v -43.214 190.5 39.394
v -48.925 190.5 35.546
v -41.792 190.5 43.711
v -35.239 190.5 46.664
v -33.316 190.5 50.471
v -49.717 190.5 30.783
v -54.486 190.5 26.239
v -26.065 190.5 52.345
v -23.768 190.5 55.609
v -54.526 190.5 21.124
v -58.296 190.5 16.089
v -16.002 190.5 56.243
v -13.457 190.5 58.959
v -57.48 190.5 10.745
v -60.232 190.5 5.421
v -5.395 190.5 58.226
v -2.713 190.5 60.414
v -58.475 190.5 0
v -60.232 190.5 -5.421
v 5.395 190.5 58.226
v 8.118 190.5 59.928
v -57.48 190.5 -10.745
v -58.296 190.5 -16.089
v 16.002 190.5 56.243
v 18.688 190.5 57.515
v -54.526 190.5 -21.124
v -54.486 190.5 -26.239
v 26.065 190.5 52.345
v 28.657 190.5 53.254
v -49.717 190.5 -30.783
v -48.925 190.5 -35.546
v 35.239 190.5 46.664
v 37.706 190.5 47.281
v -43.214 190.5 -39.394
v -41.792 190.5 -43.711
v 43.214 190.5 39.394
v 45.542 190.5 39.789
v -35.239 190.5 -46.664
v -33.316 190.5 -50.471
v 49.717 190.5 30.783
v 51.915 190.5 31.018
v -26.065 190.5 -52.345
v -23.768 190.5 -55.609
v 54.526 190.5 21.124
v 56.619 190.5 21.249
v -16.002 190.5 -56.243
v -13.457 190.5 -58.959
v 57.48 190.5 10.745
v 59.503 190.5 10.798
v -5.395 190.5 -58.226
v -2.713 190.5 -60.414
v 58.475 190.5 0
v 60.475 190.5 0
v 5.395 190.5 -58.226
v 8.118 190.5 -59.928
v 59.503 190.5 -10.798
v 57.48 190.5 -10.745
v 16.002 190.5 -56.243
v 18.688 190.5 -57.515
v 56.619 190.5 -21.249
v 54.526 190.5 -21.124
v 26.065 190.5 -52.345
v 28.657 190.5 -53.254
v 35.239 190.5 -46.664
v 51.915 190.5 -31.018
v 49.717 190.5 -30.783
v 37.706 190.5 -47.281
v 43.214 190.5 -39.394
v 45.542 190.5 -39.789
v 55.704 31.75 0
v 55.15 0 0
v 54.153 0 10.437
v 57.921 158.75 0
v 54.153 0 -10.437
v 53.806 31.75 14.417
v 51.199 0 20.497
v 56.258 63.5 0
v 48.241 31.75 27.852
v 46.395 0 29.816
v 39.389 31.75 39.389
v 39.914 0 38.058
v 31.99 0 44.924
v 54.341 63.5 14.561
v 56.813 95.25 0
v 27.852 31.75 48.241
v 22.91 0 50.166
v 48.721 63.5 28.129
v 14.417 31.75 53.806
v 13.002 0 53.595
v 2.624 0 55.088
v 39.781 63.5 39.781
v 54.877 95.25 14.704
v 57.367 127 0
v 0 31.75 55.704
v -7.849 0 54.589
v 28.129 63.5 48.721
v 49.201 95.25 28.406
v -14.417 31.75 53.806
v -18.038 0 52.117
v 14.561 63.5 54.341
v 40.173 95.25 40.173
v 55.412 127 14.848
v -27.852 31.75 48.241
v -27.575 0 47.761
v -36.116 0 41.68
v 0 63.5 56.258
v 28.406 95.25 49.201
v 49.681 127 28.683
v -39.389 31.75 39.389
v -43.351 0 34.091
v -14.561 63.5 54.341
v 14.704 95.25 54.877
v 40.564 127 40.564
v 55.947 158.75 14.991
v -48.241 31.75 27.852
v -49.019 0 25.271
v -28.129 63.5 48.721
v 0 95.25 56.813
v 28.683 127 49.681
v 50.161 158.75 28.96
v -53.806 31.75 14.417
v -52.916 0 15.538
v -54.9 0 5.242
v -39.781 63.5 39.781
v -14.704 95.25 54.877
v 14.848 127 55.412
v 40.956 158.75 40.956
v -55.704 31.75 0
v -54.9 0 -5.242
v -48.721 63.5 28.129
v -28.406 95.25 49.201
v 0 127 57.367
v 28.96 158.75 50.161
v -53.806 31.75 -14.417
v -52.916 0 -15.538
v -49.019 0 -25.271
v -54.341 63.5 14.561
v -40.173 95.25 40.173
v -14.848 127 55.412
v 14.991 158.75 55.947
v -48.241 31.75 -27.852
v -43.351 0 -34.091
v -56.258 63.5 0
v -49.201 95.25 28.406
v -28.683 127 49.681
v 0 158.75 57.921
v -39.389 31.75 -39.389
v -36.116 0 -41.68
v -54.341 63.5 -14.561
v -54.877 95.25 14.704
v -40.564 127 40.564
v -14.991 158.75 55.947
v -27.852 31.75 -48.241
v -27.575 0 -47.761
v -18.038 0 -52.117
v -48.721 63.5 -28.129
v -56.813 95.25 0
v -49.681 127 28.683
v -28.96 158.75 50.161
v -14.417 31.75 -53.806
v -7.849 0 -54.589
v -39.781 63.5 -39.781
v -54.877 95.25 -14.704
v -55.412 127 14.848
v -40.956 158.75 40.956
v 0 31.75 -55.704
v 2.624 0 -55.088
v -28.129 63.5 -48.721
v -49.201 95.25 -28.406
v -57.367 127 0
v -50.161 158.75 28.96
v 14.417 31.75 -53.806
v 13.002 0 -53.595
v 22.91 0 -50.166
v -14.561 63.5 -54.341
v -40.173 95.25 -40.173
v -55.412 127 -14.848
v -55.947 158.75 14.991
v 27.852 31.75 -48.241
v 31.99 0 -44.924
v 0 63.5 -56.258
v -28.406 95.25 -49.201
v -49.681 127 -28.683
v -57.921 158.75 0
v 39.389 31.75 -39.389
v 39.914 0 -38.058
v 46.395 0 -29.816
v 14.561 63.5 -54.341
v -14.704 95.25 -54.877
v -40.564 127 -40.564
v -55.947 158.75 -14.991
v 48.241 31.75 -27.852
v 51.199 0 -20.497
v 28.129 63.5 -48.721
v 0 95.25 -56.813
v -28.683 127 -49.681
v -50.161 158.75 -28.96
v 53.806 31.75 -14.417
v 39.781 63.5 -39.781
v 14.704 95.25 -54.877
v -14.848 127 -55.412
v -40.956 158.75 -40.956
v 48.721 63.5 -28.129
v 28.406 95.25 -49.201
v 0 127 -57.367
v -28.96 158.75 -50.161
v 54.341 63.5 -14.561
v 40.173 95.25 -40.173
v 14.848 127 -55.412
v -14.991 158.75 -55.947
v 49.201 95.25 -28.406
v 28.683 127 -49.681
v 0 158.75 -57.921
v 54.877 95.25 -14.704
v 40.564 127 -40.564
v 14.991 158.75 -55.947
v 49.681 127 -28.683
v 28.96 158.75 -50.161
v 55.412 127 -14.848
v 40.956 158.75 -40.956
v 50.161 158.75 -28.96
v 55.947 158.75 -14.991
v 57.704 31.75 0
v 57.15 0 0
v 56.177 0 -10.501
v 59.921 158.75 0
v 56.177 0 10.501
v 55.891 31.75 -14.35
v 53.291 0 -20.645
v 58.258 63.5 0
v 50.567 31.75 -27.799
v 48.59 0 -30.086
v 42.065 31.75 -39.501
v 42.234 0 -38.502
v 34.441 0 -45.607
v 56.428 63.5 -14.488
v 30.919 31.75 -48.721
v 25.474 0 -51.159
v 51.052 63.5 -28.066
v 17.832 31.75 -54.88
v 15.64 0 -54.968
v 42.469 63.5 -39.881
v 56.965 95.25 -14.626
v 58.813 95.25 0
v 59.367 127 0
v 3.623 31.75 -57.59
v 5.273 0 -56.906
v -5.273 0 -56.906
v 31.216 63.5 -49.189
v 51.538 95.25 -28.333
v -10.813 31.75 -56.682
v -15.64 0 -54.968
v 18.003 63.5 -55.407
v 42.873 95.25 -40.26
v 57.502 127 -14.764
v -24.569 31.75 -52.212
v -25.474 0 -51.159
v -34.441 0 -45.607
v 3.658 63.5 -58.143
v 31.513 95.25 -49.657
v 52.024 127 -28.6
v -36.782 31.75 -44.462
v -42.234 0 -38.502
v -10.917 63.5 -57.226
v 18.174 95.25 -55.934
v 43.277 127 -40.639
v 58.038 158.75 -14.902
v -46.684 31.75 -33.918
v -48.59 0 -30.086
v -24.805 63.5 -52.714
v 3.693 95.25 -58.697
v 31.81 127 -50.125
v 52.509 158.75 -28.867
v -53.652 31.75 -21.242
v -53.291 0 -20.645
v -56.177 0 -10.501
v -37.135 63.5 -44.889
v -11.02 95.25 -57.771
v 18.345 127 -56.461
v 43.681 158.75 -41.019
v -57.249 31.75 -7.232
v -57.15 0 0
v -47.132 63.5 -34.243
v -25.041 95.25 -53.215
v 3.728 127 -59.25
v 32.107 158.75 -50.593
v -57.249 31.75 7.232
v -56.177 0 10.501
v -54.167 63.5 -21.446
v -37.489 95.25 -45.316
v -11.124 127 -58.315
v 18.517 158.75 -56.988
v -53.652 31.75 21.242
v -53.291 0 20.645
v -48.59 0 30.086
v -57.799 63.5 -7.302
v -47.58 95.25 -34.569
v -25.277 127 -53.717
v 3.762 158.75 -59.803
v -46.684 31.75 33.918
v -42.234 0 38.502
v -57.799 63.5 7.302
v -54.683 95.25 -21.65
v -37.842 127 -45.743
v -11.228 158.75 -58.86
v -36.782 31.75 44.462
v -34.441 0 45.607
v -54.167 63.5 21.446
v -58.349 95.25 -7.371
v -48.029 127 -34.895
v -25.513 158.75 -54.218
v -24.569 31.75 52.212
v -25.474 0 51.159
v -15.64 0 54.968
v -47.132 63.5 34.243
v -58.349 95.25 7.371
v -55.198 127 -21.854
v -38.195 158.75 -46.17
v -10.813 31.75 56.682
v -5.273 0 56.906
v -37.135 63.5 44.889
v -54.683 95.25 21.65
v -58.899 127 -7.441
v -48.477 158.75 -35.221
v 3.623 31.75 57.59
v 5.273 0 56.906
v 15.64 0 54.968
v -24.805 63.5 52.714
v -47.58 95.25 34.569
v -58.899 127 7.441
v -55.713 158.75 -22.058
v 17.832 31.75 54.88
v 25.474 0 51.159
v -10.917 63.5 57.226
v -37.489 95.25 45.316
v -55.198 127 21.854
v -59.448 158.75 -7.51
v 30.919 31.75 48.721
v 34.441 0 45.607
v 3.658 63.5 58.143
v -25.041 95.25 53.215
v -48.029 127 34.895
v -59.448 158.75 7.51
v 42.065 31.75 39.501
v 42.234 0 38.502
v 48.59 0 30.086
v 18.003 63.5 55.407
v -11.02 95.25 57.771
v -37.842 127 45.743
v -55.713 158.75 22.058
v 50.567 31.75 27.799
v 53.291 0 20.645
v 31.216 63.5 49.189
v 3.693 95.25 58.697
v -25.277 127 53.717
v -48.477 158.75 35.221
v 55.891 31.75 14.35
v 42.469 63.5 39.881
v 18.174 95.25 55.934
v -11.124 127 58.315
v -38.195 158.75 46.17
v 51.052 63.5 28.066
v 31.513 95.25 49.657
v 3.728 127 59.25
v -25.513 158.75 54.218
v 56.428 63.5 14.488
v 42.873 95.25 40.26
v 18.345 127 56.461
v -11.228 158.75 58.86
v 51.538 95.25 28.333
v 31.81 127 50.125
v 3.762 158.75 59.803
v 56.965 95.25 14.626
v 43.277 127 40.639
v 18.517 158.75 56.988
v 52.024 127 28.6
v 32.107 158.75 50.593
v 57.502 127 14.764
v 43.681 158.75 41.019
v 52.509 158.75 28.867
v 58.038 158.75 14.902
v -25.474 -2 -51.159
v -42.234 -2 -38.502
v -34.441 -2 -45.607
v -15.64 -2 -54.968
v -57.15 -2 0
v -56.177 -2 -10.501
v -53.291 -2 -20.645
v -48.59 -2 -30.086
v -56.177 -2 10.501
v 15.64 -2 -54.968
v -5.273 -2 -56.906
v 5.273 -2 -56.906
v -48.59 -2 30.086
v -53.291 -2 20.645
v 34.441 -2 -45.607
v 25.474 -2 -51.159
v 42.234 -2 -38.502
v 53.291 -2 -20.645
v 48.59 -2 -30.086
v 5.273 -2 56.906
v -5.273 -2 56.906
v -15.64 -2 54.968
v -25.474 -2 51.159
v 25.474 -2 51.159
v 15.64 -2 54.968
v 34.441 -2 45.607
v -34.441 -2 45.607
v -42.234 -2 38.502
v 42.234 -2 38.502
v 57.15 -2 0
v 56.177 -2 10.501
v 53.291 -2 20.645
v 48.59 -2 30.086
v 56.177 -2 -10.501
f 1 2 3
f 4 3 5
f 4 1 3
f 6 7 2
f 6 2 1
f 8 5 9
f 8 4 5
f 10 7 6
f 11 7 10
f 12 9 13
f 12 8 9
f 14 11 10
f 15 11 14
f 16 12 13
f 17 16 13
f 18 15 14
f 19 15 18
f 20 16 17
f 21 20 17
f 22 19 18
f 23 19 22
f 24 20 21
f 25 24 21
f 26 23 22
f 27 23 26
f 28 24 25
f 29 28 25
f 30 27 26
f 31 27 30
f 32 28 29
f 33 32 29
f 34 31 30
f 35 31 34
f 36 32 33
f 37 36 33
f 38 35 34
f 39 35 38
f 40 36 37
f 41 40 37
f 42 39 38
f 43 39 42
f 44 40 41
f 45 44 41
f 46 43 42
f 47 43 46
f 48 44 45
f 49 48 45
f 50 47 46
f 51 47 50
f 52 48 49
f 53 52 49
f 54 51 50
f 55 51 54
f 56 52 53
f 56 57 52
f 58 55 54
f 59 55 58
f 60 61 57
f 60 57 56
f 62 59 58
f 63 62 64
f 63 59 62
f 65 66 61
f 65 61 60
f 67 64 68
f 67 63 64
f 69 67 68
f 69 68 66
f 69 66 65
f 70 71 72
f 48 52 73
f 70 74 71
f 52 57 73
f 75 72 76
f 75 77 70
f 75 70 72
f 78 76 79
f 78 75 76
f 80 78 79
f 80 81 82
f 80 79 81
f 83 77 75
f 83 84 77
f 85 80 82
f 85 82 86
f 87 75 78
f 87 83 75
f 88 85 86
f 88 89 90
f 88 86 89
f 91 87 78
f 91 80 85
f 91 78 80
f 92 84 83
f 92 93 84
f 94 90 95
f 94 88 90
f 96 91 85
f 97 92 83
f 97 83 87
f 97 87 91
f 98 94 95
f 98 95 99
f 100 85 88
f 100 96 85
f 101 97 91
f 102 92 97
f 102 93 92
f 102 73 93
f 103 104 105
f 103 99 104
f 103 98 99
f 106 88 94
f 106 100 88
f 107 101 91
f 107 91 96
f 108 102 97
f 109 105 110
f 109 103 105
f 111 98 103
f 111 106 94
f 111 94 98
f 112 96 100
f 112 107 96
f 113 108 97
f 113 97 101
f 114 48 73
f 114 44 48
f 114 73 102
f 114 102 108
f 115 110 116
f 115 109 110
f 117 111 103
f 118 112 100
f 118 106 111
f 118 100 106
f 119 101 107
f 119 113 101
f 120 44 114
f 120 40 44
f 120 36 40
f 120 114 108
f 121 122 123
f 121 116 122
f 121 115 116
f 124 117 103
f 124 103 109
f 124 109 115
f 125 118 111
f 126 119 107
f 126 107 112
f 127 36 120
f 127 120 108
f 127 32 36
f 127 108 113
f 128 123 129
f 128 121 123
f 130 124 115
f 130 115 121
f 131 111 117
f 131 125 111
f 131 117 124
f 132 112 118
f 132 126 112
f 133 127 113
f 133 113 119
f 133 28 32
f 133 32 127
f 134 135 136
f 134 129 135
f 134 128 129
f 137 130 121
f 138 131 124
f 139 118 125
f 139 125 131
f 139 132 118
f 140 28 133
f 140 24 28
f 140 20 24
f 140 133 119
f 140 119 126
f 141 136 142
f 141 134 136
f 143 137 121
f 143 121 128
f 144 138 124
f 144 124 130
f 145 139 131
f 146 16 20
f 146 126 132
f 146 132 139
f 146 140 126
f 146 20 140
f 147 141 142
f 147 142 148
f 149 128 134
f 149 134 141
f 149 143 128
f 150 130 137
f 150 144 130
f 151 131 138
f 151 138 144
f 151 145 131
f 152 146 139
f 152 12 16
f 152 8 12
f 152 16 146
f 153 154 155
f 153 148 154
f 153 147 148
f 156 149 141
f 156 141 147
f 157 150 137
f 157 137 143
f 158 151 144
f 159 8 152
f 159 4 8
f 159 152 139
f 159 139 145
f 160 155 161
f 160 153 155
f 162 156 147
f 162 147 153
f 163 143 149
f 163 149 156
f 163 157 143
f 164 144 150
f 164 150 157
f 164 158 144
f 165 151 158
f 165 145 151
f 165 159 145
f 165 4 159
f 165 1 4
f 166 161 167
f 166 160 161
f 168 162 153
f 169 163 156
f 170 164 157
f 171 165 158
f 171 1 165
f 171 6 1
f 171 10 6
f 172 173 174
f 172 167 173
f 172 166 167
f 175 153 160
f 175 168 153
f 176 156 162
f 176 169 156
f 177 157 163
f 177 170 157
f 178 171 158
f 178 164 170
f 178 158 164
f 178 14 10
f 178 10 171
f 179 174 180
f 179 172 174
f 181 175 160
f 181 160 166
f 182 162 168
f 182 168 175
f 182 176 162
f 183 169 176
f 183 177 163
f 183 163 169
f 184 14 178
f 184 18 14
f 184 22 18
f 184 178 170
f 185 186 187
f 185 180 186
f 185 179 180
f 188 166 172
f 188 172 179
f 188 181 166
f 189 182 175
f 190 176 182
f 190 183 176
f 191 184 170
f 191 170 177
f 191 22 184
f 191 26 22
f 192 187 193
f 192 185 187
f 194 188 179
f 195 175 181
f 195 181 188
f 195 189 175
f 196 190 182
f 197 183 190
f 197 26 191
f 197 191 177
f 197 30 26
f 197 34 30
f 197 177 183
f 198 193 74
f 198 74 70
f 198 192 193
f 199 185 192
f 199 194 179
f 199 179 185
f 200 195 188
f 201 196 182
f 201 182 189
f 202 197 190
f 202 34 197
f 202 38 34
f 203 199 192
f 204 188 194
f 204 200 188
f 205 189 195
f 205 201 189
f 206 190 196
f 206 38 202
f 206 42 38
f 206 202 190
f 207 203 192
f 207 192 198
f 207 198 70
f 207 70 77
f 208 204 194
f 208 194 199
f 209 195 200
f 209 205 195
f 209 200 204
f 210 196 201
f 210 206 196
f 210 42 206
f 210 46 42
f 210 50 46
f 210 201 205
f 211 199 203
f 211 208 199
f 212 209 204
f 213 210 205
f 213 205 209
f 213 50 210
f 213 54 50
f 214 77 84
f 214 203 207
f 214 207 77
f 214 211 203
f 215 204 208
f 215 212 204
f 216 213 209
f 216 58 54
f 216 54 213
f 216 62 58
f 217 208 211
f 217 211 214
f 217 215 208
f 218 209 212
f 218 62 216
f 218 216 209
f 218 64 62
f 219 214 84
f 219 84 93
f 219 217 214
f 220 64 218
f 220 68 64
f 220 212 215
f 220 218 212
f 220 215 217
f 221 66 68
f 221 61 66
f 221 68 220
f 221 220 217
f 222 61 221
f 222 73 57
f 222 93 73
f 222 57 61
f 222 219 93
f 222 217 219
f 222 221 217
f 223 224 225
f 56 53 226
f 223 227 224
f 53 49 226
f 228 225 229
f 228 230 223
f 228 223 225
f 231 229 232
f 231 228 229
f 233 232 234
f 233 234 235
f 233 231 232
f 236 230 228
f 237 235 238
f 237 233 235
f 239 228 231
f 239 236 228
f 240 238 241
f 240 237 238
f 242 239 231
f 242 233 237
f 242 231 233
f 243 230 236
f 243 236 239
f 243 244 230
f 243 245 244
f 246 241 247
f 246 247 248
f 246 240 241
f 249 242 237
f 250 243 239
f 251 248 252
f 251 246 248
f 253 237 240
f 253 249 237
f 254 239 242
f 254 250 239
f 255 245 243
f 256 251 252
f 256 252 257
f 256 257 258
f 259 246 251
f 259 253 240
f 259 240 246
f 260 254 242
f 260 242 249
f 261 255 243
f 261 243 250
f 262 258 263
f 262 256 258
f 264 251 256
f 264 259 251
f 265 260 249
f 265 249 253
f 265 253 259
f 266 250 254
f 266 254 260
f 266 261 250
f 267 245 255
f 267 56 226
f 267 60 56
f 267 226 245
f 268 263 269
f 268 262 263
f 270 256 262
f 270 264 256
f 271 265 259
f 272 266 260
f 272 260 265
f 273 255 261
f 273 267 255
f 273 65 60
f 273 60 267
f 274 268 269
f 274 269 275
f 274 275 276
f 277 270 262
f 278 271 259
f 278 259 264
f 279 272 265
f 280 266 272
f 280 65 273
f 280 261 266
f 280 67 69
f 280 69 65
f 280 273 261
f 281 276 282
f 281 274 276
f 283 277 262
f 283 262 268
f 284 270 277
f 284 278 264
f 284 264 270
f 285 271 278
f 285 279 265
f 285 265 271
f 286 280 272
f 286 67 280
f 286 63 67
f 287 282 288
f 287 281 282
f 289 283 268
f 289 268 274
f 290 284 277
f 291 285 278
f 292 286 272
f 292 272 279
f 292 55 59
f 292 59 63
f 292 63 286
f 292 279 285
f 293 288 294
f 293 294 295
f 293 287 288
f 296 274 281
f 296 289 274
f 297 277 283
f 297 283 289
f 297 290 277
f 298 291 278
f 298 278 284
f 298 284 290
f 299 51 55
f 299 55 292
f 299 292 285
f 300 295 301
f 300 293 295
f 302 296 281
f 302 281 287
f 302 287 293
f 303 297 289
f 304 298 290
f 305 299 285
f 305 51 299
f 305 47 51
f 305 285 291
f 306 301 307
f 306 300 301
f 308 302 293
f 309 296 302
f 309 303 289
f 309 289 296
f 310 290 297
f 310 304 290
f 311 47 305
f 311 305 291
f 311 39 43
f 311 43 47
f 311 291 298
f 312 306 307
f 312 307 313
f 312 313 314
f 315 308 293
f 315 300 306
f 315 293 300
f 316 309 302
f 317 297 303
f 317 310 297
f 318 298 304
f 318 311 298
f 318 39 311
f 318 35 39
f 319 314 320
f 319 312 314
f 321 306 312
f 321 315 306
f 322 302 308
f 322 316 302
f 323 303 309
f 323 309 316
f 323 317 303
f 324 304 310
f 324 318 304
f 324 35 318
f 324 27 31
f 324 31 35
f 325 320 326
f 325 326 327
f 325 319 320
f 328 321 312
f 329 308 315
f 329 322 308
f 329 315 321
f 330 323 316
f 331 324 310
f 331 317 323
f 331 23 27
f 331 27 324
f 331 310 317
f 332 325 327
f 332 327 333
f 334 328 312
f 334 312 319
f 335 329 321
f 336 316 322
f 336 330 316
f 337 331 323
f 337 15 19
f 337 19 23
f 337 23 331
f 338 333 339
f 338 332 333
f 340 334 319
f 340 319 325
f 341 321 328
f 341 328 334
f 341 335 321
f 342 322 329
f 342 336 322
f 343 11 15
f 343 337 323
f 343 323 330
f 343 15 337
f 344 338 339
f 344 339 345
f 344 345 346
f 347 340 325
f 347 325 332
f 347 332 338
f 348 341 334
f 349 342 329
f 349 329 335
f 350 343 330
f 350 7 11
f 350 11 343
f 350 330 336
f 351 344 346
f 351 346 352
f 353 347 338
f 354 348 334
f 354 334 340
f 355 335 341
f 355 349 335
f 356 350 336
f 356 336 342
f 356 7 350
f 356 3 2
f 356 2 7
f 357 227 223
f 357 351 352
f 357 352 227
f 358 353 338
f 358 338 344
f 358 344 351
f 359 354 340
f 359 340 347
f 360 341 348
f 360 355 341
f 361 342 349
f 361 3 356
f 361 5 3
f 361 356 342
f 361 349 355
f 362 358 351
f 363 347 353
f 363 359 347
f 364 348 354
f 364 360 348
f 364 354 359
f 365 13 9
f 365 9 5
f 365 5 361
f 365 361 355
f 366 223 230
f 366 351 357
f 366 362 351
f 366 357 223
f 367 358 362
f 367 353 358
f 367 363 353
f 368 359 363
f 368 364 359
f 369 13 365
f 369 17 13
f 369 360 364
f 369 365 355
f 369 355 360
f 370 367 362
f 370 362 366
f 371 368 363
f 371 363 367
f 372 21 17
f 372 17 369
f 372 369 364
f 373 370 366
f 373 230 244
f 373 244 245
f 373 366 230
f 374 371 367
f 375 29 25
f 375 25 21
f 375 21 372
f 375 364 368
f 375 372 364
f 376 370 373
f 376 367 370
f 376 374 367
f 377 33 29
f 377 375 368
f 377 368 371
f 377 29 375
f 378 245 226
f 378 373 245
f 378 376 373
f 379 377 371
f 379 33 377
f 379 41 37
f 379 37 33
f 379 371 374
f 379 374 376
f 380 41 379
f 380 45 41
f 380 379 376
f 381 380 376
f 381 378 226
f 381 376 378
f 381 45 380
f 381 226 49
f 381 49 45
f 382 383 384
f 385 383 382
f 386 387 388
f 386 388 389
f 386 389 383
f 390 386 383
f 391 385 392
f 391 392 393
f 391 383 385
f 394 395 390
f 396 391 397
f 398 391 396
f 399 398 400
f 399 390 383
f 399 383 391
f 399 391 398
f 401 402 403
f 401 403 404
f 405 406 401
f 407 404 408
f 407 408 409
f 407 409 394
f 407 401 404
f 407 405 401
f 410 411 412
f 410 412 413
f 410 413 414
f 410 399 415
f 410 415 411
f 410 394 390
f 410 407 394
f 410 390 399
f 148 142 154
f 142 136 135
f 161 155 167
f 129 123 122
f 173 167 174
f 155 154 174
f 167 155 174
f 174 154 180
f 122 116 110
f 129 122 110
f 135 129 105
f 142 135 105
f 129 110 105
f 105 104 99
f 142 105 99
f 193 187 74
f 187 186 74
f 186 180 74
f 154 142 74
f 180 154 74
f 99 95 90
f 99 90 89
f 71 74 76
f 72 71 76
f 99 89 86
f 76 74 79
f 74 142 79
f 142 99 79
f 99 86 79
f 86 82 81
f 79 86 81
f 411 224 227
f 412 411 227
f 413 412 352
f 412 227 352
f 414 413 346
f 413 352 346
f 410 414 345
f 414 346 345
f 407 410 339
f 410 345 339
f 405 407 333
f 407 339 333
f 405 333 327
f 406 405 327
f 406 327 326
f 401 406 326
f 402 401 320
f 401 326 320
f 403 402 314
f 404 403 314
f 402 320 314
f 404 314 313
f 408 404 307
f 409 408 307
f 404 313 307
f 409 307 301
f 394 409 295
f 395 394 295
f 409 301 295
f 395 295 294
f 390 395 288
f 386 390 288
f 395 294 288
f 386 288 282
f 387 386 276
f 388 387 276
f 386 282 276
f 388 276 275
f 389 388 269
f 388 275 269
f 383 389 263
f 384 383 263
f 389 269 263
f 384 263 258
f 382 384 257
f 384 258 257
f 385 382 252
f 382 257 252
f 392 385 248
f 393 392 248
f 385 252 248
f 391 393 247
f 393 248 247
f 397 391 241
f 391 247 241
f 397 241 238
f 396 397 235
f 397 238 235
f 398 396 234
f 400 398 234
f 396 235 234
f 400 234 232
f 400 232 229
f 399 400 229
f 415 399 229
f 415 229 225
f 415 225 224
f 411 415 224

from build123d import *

# Parameters (mm, degrees)
SKETCH1_R           = 57.15
BOSS_EXTRUDE1_DEPTH = 190.5
BOSS_EXTRUDE1_TAPER = -1
SKETCH3_R           = 55.15
CUT_EXTRUDE1_DEPTH  = 190.5
CUT_EXTRUDE1_TAPER  = -1
SKETCH4_R           = 57.15
BOSS_EXTRUDE2_DEPTH = 2


with BuildPart() as part:
    # Sketch1 → Boss-Extrude1 (new body)
    with BuildSketch(Plane(origin=(0, 0, 0), x_dir=(1, 0, 0), z_dir=(0, 1, 0))):
        Circle(SKETCH1_R)
    extrude(amount=BOSS_EXTRUDE1_DEPTH, taper=BOSS_EXTRUDE1_TAPER)

    # Sketch3 → Cut-Extrude1 (cut)
    with BuildSketch(Plane.XZ):
        Circle(SKETCH3_R)
    extrude(amount=-CUT_EXTRUDE1_DEPTH, taper=CUT_EXTRUDE1_TAPER, mode=Mode.SUBTRACT)

    # Sketch4 → Boss-Extrude2 (add)
    with BuildSketch(Plane.XZ):
        Circle(SKETCH4_R)
    extrude(amount=BOSS_EXTRUDE2_DEPTH)


solid = part.part
